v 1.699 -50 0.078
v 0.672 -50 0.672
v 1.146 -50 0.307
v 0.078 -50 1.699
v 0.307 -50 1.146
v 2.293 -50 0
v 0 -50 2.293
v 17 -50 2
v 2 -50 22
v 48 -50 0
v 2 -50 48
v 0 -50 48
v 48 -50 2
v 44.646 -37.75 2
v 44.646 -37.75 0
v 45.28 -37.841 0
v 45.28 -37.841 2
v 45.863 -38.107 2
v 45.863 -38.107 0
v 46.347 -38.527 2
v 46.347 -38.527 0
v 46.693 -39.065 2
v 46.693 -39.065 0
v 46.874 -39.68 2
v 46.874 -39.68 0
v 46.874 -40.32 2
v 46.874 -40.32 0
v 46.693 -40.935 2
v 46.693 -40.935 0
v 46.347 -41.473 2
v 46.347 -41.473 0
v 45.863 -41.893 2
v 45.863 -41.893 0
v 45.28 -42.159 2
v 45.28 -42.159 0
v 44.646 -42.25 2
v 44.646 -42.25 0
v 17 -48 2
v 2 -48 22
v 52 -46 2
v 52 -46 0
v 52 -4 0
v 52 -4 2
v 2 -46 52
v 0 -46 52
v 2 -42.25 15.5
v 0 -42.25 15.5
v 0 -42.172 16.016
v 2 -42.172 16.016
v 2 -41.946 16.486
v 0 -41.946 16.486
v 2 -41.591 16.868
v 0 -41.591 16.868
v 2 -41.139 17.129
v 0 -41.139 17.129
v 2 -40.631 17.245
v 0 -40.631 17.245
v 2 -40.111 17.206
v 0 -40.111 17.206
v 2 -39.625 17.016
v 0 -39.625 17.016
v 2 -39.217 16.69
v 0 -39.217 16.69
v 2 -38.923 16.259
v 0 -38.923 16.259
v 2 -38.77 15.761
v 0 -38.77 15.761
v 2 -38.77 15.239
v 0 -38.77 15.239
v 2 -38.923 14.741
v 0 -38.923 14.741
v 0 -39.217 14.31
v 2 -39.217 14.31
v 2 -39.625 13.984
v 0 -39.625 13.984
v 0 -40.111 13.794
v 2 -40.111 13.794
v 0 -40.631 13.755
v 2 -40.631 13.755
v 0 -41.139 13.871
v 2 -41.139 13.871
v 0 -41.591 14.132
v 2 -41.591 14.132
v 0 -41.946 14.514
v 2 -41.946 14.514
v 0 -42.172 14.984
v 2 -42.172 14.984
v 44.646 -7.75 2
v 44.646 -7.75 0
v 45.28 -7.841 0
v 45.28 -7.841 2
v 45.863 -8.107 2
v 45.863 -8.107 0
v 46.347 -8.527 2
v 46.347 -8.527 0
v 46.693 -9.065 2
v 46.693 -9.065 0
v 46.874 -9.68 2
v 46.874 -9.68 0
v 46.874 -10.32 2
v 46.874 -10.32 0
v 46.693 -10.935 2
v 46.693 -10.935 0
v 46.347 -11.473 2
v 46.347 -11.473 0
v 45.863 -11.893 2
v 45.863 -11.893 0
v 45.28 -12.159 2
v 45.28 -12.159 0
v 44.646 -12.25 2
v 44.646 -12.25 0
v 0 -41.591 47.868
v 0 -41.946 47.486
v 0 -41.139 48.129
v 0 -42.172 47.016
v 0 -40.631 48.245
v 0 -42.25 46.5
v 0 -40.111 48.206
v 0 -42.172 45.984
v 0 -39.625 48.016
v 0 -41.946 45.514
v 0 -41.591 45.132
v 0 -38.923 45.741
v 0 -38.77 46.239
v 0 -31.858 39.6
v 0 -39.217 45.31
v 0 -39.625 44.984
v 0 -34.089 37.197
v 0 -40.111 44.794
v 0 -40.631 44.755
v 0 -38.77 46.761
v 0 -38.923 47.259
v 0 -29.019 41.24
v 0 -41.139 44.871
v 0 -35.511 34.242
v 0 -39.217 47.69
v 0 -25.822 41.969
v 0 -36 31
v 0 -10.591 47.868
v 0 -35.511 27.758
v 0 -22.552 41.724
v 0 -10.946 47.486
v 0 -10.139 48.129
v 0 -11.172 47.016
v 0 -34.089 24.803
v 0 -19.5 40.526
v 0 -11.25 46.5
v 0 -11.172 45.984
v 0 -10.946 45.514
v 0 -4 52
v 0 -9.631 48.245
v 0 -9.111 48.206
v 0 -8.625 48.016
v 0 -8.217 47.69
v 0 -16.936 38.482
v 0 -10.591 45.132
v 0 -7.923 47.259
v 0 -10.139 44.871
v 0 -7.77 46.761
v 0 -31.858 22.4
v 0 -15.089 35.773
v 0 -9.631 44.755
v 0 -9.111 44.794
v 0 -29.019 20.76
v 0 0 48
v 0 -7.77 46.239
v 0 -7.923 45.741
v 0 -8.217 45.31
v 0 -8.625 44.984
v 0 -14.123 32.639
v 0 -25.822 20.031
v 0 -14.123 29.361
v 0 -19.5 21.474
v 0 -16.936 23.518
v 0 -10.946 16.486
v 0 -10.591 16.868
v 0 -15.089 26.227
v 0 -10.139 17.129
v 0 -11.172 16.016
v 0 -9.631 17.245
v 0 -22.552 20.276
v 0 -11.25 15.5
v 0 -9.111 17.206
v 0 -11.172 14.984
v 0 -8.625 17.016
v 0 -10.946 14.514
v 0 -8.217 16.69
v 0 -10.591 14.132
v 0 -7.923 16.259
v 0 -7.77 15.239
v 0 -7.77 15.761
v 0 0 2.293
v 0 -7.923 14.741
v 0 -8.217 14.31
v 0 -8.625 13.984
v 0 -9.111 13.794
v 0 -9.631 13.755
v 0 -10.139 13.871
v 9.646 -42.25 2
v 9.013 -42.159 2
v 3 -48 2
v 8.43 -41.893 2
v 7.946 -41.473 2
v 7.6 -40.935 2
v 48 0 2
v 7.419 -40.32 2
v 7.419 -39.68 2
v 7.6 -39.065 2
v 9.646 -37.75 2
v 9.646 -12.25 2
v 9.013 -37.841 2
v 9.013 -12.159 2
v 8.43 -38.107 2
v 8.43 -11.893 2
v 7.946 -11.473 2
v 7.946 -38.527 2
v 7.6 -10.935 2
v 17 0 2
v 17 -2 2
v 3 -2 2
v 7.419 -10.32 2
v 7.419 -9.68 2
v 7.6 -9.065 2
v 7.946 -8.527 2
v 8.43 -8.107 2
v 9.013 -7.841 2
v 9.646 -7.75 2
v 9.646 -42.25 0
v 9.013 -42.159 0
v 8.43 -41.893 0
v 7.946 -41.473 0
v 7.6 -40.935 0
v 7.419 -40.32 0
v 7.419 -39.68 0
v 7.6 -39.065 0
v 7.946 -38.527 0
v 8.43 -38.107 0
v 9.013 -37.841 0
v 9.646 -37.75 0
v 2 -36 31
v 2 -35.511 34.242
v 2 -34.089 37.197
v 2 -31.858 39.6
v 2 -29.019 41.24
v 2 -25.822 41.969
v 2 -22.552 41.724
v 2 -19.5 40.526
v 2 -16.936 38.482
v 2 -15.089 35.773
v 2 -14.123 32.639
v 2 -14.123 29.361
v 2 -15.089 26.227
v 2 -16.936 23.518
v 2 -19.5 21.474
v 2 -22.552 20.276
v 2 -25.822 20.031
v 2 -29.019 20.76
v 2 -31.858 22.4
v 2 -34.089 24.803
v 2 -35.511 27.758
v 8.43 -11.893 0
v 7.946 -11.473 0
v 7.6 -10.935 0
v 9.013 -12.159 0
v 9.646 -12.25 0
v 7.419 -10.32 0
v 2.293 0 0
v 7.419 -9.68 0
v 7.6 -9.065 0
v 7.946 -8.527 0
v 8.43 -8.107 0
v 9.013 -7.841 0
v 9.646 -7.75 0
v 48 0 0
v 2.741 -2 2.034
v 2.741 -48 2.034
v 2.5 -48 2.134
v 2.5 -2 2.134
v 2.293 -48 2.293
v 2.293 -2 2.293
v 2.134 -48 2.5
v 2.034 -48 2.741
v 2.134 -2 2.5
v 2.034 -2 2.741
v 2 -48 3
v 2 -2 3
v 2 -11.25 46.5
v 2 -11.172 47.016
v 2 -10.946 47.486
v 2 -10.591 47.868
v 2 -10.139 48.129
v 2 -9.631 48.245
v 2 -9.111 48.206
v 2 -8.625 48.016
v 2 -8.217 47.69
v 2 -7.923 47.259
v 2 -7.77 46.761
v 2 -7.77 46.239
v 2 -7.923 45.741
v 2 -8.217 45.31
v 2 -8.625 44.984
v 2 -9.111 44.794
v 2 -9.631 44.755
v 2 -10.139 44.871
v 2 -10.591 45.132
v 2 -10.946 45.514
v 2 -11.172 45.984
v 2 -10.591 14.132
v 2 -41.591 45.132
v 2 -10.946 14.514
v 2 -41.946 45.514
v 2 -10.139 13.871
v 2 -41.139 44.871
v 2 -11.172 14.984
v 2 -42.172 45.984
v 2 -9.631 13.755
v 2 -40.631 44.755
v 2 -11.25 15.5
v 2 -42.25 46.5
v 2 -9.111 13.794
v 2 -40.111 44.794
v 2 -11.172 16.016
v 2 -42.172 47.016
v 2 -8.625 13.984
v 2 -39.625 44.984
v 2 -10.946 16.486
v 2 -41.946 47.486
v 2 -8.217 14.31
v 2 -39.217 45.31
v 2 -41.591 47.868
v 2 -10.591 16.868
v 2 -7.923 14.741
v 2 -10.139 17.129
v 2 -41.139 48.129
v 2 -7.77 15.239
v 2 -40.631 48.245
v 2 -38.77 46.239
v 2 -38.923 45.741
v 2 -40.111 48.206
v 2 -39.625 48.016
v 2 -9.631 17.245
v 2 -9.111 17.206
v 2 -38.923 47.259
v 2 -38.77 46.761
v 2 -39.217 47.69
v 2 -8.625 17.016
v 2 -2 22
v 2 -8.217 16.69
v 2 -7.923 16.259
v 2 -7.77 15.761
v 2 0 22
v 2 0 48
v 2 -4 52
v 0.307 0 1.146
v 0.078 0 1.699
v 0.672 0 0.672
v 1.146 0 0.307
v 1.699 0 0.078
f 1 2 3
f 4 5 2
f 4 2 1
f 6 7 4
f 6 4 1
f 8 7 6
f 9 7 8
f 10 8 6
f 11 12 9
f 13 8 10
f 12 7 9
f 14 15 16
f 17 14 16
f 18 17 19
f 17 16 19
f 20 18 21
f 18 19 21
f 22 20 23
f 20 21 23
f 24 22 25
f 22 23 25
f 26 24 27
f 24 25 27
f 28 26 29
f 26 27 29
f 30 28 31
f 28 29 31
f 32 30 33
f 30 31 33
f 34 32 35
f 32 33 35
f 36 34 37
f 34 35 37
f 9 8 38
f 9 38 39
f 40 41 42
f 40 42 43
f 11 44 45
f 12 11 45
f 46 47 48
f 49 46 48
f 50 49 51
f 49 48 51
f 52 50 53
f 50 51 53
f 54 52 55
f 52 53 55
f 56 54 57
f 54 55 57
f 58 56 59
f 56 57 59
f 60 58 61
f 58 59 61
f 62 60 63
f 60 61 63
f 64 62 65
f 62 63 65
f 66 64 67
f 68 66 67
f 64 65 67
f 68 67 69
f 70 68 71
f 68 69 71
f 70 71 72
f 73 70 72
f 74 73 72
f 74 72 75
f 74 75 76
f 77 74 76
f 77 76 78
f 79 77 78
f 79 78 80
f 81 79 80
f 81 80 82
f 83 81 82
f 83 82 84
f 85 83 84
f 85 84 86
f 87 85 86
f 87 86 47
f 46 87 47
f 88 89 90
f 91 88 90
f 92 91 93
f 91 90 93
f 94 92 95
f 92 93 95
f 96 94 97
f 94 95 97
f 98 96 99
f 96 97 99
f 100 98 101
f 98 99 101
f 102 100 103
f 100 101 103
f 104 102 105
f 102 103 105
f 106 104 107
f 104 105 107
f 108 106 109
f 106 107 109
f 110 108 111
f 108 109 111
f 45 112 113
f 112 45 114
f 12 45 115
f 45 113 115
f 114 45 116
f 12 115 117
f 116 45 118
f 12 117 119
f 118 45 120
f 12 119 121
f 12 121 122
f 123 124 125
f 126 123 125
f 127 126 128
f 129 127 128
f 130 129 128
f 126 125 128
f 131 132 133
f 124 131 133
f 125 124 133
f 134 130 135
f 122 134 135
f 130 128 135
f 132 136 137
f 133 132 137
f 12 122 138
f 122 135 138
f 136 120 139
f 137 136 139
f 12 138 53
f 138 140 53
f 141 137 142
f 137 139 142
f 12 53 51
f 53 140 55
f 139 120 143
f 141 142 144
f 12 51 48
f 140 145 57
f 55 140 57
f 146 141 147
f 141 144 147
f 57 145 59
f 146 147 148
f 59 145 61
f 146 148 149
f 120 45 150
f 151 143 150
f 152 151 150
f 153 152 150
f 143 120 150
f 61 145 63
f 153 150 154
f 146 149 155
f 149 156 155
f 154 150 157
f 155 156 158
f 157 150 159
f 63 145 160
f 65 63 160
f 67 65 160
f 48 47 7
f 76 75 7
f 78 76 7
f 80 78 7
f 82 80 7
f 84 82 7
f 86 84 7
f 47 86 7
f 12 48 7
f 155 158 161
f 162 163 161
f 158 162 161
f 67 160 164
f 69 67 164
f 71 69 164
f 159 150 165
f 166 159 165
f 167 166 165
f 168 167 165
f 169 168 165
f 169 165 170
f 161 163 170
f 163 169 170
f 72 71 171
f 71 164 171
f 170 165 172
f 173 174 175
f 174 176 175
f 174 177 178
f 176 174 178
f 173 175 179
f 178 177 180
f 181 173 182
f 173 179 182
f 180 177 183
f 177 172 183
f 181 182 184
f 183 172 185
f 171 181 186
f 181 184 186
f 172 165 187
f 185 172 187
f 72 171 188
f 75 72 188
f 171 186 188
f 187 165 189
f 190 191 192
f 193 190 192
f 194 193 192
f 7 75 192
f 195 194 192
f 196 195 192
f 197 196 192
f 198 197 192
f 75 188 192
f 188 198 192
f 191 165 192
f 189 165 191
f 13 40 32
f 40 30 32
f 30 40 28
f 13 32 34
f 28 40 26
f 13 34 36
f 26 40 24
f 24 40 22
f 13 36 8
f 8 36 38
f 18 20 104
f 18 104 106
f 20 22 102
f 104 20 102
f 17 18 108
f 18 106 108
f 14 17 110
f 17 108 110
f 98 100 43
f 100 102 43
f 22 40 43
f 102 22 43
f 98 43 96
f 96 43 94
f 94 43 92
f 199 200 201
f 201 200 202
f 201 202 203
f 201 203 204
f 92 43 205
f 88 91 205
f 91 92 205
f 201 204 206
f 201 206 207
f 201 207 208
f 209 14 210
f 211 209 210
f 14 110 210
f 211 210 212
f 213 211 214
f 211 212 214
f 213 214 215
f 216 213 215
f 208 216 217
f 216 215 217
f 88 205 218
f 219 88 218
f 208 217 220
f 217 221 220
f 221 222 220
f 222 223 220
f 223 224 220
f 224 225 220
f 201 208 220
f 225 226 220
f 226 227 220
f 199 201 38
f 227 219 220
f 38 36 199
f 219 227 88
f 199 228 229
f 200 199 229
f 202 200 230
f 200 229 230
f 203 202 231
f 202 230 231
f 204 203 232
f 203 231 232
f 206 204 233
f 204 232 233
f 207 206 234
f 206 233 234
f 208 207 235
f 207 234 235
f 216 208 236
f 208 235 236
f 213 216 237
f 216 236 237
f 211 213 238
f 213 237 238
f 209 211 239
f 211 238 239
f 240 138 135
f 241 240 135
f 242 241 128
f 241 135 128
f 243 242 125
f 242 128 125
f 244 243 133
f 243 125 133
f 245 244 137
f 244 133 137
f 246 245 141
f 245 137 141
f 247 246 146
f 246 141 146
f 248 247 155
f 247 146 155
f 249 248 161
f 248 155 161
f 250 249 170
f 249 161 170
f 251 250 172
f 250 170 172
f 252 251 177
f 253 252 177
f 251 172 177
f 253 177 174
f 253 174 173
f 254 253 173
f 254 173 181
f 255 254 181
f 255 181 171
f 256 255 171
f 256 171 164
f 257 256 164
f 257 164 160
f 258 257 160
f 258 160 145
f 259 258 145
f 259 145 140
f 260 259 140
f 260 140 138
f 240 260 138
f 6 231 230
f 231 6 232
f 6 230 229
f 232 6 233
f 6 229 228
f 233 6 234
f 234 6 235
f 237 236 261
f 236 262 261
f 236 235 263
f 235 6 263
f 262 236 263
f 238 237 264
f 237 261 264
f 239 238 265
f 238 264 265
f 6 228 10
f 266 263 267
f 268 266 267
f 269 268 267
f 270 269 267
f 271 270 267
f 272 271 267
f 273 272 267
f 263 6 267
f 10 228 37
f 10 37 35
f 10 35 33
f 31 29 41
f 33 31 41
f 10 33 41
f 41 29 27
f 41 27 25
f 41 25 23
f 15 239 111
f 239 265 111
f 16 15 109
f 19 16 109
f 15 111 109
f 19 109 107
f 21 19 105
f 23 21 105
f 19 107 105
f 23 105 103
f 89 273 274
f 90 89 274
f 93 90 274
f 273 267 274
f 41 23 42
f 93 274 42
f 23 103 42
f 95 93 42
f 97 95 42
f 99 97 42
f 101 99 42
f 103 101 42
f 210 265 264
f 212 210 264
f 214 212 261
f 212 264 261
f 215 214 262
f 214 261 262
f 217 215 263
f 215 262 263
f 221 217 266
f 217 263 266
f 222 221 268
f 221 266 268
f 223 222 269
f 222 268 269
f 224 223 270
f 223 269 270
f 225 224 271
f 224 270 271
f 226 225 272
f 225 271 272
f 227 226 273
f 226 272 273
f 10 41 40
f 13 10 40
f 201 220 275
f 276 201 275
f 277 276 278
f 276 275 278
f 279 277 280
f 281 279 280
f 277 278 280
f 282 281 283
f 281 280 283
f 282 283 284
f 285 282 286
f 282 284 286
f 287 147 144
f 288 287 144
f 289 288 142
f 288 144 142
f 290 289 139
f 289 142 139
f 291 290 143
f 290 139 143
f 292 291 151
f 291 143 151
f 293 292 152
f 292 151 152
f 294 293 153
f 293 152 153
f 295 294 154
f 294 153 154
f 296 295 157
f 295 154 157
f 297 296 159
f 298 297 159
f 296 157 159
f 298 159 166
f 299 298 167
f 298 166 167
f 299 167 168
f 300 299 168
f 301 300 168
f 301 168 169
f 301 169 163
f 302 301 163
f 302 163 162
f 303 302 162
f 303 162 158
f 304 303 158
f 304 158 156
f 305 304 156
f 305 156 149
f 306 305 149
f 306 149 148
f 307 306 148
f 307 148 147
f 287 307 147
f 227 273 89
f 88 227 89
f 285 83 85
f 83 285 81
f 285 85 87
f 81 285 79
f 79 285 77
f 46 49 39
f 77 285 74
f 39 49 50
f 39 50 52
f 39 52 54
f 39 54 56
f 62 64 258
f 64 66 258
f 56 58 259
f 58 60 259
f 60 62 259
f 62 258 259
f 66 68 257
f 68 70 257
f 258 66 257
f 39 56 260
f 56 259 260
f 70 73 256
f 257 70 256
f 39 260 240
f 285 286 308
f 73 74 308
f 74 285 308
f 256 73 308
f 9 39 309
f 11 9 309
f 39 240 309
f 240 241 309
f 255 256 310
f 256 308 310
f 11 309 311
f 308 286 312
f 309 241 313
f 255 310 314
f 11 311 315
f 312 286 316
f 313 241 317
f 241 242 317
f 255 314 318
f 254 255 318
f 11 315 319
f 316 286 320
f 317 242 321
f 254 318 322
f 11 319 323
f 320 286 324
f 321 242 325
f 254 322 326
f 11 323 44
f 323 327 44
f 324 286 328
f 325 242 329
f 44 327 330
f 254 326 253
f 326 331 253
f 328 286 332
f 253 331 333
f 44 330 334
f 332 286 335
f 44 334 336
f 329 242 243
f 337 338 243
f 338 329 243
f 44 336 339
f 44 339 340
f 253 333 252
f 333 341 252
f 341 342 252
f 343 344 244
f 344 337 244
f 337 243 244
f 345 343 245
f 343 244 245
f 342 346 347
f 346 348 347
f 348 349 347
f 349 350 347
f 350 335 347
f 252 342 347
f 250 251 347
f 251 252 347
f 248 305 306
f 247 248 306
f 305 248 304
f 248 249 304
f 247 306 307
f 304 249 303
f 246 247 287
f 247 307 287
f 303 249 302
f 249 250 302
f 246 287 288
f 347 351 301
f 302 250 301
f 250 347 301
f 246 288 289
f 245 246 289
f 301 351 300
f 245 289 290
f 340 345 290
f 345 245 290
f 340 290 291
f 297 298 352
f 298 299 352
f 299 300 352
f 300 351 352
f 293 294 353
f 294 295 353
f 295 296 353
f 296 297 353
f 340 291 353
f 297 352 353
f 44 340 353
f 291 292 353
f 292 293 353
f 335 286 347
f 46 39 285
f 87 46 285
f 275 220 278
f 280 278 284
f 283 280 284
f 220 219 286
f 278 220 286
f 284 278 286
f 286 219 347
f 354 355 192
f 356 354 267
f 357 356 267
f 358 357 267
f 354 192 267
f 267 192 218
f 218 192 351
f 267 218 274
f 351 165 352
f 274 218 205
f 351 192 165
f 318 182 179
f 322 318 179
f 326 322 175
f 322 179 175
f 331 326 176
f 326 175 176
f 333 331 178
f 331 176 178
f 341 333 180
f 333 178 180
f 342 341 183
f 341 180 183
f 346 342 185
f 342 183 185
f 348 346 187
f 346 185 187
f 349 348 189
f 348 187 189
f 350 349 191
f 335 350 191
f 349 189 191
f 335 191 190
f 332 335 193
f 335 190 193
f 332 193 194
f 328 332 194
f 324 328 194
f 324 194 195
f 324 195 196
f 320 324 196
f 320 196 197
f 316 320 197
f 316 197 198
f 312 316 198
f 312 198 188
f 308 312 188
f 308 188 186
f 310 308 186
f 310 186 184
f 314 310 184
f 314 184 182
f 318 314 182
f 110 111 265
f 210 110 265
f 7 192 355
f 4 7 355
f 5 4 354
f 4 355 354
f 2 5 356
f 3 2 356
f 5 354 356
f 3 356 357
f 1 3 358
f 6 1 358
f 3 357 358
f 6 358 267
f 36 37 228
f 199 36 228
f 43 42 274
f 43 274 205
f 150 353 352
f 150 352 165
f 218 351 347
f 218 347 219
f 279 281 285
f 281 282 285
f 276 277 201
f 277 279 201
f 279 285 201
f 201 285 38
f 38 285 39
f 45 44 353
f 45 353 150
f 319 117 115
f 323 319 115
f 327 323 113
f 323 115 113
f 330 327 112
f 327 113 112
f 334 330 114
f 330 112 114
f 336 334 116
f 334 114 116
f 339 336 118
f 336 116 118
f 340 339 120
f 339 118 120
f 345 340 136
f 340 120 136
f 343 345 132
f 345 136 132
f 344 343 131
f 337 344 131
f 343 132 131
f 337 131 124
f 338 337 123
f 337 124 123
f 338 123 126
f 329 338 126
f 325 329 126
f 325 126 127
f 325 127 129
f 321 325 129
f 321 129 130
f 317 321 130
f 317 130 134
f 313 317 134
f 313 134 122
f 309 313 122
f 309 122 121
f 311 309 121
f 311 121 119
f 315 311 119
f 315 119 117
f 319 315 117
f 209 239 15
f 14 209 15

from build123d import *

# Parameters (mm, degrees)
F1_DEPTH = 50
F3_DEPTH = 2
F5_DEPTH = 2
F7_DEPTH = 52.001
F8_R     = 11
F8_R_2   = 1.75
F9_DEPTH = 52.001
F10_SIZE = 4


with BuildPart() as f1:
    # F0 (on Front) → F1 (new body)
    with BuildSketch(Plane.XZ):
        with BuildLine():
            Line((2, 52), (0, 52))
            Line((0, 52), (0, 2.292893))
            ThreePointArc((0, 2.292893), (0.671573, 0.671573), (2.292893, 0))
            Line((2.292893, 0), (52, 0))
            Line((52, 0), (52, 2))
            Line((52, 2), (3, 2))
            ThreePointArc((3, 2), (2.292893, 2.292893), (2, 3))
            Line((2, 3), (2, 52))
        make_face()
    extrude(amount=F1_DEPTH)

    # F2 (on face) → F3 (join)
    with BuildSketch(Plane.XZ.offset(50)):
        Polygon((17, 2), (2, 22), (2, 2), align=None)
    extrude(amount=-F3_DEPTH)

    # F4 (on face) → F5 (join)
    with BuildSketch(Plane(origin=(0, 0, 0), x_dir=(-1, 0, 0), z_dir=(0, 1, 0))):
        Polygon((-2, 2), (-2, 22), (-17, 2), align=None)
    extrude(amount=-F5_DEPTH)

    # F6 (on face) → F7 (cut, through all)
    with BuildSketch(Plane(origin=(0, 0, 0), x_dir=(1, 0, 0), z_dir=(0, 0, -1))):
        with BuildLine():
            Line((27.146447, 37.75), (44.646447, 37.75))
            ThreePointArc((44.646447, 37.75), (46.896447, 40), (44.646447, 42.25))
            Line((44.646447, 42.25), (27.146447, 42.25))
            Line((27.146447, 42.25), (9.646447, 42.25))
            ThreePointArc((9.646447, 42.25), (7.396447, 40), (9.646447, 37.75))
            Line((9.646447, 37.75), (27.146447, 37.75))
        make_face()
        with BuildLine():
            Line((27.146447, 12.25), (9.646447, 12.25))
            ThreePointArc((9.646447, 12.25), (7.396447, 10), (9.646447, 7.75))
            Line((9.646447, 7.75), (27.146447, 7.75))
            Line((27.146447, 7.75), (44.646447, 7.75))
            ThreePointArc((44.646447, 7.75), (46.896447, 10), (44.646447, 12.25))
            Line((44.646447, 12.25), (27.146447, 12.25))
        make_face()
    extrude(amount=-F7_DEPTH, mode=Mode.SUBTRACT)

    # F8 (on face) → F9 (cut, through all)
    with BuildSketch(Plane(origin=(0, 0, 0), x_dir=(0, -1, 0), z_dir=(-1, 0, 0))):
        with Locations((25, 31)):
            Circle(F8_R)
        with Locations((9.5, 46.5)):
            Circle(F8_R_2)
        with Locations((9.5, 15.5)):
            Circle(F8_R_2)
        with Locations((40.5, 15.5)):
            Circle(F8_R_2)
        with Locations((40.5, 46.5)):
            Circle(F8_R_2)
    extrude(amount=-F9_DEPTH, mode=Mode.SUBTRACT)

    # F10
    f10_edges = [f1.edges().sort_by_distance(p)[0] for p in [
        (1, 0, 52),
        (1, -50, 52),
        (52, 0, 1),
        (52, -50, 1),
    ]]
    chamfer(f10_edges, length=F10_SIZE)


solid = f1.part
